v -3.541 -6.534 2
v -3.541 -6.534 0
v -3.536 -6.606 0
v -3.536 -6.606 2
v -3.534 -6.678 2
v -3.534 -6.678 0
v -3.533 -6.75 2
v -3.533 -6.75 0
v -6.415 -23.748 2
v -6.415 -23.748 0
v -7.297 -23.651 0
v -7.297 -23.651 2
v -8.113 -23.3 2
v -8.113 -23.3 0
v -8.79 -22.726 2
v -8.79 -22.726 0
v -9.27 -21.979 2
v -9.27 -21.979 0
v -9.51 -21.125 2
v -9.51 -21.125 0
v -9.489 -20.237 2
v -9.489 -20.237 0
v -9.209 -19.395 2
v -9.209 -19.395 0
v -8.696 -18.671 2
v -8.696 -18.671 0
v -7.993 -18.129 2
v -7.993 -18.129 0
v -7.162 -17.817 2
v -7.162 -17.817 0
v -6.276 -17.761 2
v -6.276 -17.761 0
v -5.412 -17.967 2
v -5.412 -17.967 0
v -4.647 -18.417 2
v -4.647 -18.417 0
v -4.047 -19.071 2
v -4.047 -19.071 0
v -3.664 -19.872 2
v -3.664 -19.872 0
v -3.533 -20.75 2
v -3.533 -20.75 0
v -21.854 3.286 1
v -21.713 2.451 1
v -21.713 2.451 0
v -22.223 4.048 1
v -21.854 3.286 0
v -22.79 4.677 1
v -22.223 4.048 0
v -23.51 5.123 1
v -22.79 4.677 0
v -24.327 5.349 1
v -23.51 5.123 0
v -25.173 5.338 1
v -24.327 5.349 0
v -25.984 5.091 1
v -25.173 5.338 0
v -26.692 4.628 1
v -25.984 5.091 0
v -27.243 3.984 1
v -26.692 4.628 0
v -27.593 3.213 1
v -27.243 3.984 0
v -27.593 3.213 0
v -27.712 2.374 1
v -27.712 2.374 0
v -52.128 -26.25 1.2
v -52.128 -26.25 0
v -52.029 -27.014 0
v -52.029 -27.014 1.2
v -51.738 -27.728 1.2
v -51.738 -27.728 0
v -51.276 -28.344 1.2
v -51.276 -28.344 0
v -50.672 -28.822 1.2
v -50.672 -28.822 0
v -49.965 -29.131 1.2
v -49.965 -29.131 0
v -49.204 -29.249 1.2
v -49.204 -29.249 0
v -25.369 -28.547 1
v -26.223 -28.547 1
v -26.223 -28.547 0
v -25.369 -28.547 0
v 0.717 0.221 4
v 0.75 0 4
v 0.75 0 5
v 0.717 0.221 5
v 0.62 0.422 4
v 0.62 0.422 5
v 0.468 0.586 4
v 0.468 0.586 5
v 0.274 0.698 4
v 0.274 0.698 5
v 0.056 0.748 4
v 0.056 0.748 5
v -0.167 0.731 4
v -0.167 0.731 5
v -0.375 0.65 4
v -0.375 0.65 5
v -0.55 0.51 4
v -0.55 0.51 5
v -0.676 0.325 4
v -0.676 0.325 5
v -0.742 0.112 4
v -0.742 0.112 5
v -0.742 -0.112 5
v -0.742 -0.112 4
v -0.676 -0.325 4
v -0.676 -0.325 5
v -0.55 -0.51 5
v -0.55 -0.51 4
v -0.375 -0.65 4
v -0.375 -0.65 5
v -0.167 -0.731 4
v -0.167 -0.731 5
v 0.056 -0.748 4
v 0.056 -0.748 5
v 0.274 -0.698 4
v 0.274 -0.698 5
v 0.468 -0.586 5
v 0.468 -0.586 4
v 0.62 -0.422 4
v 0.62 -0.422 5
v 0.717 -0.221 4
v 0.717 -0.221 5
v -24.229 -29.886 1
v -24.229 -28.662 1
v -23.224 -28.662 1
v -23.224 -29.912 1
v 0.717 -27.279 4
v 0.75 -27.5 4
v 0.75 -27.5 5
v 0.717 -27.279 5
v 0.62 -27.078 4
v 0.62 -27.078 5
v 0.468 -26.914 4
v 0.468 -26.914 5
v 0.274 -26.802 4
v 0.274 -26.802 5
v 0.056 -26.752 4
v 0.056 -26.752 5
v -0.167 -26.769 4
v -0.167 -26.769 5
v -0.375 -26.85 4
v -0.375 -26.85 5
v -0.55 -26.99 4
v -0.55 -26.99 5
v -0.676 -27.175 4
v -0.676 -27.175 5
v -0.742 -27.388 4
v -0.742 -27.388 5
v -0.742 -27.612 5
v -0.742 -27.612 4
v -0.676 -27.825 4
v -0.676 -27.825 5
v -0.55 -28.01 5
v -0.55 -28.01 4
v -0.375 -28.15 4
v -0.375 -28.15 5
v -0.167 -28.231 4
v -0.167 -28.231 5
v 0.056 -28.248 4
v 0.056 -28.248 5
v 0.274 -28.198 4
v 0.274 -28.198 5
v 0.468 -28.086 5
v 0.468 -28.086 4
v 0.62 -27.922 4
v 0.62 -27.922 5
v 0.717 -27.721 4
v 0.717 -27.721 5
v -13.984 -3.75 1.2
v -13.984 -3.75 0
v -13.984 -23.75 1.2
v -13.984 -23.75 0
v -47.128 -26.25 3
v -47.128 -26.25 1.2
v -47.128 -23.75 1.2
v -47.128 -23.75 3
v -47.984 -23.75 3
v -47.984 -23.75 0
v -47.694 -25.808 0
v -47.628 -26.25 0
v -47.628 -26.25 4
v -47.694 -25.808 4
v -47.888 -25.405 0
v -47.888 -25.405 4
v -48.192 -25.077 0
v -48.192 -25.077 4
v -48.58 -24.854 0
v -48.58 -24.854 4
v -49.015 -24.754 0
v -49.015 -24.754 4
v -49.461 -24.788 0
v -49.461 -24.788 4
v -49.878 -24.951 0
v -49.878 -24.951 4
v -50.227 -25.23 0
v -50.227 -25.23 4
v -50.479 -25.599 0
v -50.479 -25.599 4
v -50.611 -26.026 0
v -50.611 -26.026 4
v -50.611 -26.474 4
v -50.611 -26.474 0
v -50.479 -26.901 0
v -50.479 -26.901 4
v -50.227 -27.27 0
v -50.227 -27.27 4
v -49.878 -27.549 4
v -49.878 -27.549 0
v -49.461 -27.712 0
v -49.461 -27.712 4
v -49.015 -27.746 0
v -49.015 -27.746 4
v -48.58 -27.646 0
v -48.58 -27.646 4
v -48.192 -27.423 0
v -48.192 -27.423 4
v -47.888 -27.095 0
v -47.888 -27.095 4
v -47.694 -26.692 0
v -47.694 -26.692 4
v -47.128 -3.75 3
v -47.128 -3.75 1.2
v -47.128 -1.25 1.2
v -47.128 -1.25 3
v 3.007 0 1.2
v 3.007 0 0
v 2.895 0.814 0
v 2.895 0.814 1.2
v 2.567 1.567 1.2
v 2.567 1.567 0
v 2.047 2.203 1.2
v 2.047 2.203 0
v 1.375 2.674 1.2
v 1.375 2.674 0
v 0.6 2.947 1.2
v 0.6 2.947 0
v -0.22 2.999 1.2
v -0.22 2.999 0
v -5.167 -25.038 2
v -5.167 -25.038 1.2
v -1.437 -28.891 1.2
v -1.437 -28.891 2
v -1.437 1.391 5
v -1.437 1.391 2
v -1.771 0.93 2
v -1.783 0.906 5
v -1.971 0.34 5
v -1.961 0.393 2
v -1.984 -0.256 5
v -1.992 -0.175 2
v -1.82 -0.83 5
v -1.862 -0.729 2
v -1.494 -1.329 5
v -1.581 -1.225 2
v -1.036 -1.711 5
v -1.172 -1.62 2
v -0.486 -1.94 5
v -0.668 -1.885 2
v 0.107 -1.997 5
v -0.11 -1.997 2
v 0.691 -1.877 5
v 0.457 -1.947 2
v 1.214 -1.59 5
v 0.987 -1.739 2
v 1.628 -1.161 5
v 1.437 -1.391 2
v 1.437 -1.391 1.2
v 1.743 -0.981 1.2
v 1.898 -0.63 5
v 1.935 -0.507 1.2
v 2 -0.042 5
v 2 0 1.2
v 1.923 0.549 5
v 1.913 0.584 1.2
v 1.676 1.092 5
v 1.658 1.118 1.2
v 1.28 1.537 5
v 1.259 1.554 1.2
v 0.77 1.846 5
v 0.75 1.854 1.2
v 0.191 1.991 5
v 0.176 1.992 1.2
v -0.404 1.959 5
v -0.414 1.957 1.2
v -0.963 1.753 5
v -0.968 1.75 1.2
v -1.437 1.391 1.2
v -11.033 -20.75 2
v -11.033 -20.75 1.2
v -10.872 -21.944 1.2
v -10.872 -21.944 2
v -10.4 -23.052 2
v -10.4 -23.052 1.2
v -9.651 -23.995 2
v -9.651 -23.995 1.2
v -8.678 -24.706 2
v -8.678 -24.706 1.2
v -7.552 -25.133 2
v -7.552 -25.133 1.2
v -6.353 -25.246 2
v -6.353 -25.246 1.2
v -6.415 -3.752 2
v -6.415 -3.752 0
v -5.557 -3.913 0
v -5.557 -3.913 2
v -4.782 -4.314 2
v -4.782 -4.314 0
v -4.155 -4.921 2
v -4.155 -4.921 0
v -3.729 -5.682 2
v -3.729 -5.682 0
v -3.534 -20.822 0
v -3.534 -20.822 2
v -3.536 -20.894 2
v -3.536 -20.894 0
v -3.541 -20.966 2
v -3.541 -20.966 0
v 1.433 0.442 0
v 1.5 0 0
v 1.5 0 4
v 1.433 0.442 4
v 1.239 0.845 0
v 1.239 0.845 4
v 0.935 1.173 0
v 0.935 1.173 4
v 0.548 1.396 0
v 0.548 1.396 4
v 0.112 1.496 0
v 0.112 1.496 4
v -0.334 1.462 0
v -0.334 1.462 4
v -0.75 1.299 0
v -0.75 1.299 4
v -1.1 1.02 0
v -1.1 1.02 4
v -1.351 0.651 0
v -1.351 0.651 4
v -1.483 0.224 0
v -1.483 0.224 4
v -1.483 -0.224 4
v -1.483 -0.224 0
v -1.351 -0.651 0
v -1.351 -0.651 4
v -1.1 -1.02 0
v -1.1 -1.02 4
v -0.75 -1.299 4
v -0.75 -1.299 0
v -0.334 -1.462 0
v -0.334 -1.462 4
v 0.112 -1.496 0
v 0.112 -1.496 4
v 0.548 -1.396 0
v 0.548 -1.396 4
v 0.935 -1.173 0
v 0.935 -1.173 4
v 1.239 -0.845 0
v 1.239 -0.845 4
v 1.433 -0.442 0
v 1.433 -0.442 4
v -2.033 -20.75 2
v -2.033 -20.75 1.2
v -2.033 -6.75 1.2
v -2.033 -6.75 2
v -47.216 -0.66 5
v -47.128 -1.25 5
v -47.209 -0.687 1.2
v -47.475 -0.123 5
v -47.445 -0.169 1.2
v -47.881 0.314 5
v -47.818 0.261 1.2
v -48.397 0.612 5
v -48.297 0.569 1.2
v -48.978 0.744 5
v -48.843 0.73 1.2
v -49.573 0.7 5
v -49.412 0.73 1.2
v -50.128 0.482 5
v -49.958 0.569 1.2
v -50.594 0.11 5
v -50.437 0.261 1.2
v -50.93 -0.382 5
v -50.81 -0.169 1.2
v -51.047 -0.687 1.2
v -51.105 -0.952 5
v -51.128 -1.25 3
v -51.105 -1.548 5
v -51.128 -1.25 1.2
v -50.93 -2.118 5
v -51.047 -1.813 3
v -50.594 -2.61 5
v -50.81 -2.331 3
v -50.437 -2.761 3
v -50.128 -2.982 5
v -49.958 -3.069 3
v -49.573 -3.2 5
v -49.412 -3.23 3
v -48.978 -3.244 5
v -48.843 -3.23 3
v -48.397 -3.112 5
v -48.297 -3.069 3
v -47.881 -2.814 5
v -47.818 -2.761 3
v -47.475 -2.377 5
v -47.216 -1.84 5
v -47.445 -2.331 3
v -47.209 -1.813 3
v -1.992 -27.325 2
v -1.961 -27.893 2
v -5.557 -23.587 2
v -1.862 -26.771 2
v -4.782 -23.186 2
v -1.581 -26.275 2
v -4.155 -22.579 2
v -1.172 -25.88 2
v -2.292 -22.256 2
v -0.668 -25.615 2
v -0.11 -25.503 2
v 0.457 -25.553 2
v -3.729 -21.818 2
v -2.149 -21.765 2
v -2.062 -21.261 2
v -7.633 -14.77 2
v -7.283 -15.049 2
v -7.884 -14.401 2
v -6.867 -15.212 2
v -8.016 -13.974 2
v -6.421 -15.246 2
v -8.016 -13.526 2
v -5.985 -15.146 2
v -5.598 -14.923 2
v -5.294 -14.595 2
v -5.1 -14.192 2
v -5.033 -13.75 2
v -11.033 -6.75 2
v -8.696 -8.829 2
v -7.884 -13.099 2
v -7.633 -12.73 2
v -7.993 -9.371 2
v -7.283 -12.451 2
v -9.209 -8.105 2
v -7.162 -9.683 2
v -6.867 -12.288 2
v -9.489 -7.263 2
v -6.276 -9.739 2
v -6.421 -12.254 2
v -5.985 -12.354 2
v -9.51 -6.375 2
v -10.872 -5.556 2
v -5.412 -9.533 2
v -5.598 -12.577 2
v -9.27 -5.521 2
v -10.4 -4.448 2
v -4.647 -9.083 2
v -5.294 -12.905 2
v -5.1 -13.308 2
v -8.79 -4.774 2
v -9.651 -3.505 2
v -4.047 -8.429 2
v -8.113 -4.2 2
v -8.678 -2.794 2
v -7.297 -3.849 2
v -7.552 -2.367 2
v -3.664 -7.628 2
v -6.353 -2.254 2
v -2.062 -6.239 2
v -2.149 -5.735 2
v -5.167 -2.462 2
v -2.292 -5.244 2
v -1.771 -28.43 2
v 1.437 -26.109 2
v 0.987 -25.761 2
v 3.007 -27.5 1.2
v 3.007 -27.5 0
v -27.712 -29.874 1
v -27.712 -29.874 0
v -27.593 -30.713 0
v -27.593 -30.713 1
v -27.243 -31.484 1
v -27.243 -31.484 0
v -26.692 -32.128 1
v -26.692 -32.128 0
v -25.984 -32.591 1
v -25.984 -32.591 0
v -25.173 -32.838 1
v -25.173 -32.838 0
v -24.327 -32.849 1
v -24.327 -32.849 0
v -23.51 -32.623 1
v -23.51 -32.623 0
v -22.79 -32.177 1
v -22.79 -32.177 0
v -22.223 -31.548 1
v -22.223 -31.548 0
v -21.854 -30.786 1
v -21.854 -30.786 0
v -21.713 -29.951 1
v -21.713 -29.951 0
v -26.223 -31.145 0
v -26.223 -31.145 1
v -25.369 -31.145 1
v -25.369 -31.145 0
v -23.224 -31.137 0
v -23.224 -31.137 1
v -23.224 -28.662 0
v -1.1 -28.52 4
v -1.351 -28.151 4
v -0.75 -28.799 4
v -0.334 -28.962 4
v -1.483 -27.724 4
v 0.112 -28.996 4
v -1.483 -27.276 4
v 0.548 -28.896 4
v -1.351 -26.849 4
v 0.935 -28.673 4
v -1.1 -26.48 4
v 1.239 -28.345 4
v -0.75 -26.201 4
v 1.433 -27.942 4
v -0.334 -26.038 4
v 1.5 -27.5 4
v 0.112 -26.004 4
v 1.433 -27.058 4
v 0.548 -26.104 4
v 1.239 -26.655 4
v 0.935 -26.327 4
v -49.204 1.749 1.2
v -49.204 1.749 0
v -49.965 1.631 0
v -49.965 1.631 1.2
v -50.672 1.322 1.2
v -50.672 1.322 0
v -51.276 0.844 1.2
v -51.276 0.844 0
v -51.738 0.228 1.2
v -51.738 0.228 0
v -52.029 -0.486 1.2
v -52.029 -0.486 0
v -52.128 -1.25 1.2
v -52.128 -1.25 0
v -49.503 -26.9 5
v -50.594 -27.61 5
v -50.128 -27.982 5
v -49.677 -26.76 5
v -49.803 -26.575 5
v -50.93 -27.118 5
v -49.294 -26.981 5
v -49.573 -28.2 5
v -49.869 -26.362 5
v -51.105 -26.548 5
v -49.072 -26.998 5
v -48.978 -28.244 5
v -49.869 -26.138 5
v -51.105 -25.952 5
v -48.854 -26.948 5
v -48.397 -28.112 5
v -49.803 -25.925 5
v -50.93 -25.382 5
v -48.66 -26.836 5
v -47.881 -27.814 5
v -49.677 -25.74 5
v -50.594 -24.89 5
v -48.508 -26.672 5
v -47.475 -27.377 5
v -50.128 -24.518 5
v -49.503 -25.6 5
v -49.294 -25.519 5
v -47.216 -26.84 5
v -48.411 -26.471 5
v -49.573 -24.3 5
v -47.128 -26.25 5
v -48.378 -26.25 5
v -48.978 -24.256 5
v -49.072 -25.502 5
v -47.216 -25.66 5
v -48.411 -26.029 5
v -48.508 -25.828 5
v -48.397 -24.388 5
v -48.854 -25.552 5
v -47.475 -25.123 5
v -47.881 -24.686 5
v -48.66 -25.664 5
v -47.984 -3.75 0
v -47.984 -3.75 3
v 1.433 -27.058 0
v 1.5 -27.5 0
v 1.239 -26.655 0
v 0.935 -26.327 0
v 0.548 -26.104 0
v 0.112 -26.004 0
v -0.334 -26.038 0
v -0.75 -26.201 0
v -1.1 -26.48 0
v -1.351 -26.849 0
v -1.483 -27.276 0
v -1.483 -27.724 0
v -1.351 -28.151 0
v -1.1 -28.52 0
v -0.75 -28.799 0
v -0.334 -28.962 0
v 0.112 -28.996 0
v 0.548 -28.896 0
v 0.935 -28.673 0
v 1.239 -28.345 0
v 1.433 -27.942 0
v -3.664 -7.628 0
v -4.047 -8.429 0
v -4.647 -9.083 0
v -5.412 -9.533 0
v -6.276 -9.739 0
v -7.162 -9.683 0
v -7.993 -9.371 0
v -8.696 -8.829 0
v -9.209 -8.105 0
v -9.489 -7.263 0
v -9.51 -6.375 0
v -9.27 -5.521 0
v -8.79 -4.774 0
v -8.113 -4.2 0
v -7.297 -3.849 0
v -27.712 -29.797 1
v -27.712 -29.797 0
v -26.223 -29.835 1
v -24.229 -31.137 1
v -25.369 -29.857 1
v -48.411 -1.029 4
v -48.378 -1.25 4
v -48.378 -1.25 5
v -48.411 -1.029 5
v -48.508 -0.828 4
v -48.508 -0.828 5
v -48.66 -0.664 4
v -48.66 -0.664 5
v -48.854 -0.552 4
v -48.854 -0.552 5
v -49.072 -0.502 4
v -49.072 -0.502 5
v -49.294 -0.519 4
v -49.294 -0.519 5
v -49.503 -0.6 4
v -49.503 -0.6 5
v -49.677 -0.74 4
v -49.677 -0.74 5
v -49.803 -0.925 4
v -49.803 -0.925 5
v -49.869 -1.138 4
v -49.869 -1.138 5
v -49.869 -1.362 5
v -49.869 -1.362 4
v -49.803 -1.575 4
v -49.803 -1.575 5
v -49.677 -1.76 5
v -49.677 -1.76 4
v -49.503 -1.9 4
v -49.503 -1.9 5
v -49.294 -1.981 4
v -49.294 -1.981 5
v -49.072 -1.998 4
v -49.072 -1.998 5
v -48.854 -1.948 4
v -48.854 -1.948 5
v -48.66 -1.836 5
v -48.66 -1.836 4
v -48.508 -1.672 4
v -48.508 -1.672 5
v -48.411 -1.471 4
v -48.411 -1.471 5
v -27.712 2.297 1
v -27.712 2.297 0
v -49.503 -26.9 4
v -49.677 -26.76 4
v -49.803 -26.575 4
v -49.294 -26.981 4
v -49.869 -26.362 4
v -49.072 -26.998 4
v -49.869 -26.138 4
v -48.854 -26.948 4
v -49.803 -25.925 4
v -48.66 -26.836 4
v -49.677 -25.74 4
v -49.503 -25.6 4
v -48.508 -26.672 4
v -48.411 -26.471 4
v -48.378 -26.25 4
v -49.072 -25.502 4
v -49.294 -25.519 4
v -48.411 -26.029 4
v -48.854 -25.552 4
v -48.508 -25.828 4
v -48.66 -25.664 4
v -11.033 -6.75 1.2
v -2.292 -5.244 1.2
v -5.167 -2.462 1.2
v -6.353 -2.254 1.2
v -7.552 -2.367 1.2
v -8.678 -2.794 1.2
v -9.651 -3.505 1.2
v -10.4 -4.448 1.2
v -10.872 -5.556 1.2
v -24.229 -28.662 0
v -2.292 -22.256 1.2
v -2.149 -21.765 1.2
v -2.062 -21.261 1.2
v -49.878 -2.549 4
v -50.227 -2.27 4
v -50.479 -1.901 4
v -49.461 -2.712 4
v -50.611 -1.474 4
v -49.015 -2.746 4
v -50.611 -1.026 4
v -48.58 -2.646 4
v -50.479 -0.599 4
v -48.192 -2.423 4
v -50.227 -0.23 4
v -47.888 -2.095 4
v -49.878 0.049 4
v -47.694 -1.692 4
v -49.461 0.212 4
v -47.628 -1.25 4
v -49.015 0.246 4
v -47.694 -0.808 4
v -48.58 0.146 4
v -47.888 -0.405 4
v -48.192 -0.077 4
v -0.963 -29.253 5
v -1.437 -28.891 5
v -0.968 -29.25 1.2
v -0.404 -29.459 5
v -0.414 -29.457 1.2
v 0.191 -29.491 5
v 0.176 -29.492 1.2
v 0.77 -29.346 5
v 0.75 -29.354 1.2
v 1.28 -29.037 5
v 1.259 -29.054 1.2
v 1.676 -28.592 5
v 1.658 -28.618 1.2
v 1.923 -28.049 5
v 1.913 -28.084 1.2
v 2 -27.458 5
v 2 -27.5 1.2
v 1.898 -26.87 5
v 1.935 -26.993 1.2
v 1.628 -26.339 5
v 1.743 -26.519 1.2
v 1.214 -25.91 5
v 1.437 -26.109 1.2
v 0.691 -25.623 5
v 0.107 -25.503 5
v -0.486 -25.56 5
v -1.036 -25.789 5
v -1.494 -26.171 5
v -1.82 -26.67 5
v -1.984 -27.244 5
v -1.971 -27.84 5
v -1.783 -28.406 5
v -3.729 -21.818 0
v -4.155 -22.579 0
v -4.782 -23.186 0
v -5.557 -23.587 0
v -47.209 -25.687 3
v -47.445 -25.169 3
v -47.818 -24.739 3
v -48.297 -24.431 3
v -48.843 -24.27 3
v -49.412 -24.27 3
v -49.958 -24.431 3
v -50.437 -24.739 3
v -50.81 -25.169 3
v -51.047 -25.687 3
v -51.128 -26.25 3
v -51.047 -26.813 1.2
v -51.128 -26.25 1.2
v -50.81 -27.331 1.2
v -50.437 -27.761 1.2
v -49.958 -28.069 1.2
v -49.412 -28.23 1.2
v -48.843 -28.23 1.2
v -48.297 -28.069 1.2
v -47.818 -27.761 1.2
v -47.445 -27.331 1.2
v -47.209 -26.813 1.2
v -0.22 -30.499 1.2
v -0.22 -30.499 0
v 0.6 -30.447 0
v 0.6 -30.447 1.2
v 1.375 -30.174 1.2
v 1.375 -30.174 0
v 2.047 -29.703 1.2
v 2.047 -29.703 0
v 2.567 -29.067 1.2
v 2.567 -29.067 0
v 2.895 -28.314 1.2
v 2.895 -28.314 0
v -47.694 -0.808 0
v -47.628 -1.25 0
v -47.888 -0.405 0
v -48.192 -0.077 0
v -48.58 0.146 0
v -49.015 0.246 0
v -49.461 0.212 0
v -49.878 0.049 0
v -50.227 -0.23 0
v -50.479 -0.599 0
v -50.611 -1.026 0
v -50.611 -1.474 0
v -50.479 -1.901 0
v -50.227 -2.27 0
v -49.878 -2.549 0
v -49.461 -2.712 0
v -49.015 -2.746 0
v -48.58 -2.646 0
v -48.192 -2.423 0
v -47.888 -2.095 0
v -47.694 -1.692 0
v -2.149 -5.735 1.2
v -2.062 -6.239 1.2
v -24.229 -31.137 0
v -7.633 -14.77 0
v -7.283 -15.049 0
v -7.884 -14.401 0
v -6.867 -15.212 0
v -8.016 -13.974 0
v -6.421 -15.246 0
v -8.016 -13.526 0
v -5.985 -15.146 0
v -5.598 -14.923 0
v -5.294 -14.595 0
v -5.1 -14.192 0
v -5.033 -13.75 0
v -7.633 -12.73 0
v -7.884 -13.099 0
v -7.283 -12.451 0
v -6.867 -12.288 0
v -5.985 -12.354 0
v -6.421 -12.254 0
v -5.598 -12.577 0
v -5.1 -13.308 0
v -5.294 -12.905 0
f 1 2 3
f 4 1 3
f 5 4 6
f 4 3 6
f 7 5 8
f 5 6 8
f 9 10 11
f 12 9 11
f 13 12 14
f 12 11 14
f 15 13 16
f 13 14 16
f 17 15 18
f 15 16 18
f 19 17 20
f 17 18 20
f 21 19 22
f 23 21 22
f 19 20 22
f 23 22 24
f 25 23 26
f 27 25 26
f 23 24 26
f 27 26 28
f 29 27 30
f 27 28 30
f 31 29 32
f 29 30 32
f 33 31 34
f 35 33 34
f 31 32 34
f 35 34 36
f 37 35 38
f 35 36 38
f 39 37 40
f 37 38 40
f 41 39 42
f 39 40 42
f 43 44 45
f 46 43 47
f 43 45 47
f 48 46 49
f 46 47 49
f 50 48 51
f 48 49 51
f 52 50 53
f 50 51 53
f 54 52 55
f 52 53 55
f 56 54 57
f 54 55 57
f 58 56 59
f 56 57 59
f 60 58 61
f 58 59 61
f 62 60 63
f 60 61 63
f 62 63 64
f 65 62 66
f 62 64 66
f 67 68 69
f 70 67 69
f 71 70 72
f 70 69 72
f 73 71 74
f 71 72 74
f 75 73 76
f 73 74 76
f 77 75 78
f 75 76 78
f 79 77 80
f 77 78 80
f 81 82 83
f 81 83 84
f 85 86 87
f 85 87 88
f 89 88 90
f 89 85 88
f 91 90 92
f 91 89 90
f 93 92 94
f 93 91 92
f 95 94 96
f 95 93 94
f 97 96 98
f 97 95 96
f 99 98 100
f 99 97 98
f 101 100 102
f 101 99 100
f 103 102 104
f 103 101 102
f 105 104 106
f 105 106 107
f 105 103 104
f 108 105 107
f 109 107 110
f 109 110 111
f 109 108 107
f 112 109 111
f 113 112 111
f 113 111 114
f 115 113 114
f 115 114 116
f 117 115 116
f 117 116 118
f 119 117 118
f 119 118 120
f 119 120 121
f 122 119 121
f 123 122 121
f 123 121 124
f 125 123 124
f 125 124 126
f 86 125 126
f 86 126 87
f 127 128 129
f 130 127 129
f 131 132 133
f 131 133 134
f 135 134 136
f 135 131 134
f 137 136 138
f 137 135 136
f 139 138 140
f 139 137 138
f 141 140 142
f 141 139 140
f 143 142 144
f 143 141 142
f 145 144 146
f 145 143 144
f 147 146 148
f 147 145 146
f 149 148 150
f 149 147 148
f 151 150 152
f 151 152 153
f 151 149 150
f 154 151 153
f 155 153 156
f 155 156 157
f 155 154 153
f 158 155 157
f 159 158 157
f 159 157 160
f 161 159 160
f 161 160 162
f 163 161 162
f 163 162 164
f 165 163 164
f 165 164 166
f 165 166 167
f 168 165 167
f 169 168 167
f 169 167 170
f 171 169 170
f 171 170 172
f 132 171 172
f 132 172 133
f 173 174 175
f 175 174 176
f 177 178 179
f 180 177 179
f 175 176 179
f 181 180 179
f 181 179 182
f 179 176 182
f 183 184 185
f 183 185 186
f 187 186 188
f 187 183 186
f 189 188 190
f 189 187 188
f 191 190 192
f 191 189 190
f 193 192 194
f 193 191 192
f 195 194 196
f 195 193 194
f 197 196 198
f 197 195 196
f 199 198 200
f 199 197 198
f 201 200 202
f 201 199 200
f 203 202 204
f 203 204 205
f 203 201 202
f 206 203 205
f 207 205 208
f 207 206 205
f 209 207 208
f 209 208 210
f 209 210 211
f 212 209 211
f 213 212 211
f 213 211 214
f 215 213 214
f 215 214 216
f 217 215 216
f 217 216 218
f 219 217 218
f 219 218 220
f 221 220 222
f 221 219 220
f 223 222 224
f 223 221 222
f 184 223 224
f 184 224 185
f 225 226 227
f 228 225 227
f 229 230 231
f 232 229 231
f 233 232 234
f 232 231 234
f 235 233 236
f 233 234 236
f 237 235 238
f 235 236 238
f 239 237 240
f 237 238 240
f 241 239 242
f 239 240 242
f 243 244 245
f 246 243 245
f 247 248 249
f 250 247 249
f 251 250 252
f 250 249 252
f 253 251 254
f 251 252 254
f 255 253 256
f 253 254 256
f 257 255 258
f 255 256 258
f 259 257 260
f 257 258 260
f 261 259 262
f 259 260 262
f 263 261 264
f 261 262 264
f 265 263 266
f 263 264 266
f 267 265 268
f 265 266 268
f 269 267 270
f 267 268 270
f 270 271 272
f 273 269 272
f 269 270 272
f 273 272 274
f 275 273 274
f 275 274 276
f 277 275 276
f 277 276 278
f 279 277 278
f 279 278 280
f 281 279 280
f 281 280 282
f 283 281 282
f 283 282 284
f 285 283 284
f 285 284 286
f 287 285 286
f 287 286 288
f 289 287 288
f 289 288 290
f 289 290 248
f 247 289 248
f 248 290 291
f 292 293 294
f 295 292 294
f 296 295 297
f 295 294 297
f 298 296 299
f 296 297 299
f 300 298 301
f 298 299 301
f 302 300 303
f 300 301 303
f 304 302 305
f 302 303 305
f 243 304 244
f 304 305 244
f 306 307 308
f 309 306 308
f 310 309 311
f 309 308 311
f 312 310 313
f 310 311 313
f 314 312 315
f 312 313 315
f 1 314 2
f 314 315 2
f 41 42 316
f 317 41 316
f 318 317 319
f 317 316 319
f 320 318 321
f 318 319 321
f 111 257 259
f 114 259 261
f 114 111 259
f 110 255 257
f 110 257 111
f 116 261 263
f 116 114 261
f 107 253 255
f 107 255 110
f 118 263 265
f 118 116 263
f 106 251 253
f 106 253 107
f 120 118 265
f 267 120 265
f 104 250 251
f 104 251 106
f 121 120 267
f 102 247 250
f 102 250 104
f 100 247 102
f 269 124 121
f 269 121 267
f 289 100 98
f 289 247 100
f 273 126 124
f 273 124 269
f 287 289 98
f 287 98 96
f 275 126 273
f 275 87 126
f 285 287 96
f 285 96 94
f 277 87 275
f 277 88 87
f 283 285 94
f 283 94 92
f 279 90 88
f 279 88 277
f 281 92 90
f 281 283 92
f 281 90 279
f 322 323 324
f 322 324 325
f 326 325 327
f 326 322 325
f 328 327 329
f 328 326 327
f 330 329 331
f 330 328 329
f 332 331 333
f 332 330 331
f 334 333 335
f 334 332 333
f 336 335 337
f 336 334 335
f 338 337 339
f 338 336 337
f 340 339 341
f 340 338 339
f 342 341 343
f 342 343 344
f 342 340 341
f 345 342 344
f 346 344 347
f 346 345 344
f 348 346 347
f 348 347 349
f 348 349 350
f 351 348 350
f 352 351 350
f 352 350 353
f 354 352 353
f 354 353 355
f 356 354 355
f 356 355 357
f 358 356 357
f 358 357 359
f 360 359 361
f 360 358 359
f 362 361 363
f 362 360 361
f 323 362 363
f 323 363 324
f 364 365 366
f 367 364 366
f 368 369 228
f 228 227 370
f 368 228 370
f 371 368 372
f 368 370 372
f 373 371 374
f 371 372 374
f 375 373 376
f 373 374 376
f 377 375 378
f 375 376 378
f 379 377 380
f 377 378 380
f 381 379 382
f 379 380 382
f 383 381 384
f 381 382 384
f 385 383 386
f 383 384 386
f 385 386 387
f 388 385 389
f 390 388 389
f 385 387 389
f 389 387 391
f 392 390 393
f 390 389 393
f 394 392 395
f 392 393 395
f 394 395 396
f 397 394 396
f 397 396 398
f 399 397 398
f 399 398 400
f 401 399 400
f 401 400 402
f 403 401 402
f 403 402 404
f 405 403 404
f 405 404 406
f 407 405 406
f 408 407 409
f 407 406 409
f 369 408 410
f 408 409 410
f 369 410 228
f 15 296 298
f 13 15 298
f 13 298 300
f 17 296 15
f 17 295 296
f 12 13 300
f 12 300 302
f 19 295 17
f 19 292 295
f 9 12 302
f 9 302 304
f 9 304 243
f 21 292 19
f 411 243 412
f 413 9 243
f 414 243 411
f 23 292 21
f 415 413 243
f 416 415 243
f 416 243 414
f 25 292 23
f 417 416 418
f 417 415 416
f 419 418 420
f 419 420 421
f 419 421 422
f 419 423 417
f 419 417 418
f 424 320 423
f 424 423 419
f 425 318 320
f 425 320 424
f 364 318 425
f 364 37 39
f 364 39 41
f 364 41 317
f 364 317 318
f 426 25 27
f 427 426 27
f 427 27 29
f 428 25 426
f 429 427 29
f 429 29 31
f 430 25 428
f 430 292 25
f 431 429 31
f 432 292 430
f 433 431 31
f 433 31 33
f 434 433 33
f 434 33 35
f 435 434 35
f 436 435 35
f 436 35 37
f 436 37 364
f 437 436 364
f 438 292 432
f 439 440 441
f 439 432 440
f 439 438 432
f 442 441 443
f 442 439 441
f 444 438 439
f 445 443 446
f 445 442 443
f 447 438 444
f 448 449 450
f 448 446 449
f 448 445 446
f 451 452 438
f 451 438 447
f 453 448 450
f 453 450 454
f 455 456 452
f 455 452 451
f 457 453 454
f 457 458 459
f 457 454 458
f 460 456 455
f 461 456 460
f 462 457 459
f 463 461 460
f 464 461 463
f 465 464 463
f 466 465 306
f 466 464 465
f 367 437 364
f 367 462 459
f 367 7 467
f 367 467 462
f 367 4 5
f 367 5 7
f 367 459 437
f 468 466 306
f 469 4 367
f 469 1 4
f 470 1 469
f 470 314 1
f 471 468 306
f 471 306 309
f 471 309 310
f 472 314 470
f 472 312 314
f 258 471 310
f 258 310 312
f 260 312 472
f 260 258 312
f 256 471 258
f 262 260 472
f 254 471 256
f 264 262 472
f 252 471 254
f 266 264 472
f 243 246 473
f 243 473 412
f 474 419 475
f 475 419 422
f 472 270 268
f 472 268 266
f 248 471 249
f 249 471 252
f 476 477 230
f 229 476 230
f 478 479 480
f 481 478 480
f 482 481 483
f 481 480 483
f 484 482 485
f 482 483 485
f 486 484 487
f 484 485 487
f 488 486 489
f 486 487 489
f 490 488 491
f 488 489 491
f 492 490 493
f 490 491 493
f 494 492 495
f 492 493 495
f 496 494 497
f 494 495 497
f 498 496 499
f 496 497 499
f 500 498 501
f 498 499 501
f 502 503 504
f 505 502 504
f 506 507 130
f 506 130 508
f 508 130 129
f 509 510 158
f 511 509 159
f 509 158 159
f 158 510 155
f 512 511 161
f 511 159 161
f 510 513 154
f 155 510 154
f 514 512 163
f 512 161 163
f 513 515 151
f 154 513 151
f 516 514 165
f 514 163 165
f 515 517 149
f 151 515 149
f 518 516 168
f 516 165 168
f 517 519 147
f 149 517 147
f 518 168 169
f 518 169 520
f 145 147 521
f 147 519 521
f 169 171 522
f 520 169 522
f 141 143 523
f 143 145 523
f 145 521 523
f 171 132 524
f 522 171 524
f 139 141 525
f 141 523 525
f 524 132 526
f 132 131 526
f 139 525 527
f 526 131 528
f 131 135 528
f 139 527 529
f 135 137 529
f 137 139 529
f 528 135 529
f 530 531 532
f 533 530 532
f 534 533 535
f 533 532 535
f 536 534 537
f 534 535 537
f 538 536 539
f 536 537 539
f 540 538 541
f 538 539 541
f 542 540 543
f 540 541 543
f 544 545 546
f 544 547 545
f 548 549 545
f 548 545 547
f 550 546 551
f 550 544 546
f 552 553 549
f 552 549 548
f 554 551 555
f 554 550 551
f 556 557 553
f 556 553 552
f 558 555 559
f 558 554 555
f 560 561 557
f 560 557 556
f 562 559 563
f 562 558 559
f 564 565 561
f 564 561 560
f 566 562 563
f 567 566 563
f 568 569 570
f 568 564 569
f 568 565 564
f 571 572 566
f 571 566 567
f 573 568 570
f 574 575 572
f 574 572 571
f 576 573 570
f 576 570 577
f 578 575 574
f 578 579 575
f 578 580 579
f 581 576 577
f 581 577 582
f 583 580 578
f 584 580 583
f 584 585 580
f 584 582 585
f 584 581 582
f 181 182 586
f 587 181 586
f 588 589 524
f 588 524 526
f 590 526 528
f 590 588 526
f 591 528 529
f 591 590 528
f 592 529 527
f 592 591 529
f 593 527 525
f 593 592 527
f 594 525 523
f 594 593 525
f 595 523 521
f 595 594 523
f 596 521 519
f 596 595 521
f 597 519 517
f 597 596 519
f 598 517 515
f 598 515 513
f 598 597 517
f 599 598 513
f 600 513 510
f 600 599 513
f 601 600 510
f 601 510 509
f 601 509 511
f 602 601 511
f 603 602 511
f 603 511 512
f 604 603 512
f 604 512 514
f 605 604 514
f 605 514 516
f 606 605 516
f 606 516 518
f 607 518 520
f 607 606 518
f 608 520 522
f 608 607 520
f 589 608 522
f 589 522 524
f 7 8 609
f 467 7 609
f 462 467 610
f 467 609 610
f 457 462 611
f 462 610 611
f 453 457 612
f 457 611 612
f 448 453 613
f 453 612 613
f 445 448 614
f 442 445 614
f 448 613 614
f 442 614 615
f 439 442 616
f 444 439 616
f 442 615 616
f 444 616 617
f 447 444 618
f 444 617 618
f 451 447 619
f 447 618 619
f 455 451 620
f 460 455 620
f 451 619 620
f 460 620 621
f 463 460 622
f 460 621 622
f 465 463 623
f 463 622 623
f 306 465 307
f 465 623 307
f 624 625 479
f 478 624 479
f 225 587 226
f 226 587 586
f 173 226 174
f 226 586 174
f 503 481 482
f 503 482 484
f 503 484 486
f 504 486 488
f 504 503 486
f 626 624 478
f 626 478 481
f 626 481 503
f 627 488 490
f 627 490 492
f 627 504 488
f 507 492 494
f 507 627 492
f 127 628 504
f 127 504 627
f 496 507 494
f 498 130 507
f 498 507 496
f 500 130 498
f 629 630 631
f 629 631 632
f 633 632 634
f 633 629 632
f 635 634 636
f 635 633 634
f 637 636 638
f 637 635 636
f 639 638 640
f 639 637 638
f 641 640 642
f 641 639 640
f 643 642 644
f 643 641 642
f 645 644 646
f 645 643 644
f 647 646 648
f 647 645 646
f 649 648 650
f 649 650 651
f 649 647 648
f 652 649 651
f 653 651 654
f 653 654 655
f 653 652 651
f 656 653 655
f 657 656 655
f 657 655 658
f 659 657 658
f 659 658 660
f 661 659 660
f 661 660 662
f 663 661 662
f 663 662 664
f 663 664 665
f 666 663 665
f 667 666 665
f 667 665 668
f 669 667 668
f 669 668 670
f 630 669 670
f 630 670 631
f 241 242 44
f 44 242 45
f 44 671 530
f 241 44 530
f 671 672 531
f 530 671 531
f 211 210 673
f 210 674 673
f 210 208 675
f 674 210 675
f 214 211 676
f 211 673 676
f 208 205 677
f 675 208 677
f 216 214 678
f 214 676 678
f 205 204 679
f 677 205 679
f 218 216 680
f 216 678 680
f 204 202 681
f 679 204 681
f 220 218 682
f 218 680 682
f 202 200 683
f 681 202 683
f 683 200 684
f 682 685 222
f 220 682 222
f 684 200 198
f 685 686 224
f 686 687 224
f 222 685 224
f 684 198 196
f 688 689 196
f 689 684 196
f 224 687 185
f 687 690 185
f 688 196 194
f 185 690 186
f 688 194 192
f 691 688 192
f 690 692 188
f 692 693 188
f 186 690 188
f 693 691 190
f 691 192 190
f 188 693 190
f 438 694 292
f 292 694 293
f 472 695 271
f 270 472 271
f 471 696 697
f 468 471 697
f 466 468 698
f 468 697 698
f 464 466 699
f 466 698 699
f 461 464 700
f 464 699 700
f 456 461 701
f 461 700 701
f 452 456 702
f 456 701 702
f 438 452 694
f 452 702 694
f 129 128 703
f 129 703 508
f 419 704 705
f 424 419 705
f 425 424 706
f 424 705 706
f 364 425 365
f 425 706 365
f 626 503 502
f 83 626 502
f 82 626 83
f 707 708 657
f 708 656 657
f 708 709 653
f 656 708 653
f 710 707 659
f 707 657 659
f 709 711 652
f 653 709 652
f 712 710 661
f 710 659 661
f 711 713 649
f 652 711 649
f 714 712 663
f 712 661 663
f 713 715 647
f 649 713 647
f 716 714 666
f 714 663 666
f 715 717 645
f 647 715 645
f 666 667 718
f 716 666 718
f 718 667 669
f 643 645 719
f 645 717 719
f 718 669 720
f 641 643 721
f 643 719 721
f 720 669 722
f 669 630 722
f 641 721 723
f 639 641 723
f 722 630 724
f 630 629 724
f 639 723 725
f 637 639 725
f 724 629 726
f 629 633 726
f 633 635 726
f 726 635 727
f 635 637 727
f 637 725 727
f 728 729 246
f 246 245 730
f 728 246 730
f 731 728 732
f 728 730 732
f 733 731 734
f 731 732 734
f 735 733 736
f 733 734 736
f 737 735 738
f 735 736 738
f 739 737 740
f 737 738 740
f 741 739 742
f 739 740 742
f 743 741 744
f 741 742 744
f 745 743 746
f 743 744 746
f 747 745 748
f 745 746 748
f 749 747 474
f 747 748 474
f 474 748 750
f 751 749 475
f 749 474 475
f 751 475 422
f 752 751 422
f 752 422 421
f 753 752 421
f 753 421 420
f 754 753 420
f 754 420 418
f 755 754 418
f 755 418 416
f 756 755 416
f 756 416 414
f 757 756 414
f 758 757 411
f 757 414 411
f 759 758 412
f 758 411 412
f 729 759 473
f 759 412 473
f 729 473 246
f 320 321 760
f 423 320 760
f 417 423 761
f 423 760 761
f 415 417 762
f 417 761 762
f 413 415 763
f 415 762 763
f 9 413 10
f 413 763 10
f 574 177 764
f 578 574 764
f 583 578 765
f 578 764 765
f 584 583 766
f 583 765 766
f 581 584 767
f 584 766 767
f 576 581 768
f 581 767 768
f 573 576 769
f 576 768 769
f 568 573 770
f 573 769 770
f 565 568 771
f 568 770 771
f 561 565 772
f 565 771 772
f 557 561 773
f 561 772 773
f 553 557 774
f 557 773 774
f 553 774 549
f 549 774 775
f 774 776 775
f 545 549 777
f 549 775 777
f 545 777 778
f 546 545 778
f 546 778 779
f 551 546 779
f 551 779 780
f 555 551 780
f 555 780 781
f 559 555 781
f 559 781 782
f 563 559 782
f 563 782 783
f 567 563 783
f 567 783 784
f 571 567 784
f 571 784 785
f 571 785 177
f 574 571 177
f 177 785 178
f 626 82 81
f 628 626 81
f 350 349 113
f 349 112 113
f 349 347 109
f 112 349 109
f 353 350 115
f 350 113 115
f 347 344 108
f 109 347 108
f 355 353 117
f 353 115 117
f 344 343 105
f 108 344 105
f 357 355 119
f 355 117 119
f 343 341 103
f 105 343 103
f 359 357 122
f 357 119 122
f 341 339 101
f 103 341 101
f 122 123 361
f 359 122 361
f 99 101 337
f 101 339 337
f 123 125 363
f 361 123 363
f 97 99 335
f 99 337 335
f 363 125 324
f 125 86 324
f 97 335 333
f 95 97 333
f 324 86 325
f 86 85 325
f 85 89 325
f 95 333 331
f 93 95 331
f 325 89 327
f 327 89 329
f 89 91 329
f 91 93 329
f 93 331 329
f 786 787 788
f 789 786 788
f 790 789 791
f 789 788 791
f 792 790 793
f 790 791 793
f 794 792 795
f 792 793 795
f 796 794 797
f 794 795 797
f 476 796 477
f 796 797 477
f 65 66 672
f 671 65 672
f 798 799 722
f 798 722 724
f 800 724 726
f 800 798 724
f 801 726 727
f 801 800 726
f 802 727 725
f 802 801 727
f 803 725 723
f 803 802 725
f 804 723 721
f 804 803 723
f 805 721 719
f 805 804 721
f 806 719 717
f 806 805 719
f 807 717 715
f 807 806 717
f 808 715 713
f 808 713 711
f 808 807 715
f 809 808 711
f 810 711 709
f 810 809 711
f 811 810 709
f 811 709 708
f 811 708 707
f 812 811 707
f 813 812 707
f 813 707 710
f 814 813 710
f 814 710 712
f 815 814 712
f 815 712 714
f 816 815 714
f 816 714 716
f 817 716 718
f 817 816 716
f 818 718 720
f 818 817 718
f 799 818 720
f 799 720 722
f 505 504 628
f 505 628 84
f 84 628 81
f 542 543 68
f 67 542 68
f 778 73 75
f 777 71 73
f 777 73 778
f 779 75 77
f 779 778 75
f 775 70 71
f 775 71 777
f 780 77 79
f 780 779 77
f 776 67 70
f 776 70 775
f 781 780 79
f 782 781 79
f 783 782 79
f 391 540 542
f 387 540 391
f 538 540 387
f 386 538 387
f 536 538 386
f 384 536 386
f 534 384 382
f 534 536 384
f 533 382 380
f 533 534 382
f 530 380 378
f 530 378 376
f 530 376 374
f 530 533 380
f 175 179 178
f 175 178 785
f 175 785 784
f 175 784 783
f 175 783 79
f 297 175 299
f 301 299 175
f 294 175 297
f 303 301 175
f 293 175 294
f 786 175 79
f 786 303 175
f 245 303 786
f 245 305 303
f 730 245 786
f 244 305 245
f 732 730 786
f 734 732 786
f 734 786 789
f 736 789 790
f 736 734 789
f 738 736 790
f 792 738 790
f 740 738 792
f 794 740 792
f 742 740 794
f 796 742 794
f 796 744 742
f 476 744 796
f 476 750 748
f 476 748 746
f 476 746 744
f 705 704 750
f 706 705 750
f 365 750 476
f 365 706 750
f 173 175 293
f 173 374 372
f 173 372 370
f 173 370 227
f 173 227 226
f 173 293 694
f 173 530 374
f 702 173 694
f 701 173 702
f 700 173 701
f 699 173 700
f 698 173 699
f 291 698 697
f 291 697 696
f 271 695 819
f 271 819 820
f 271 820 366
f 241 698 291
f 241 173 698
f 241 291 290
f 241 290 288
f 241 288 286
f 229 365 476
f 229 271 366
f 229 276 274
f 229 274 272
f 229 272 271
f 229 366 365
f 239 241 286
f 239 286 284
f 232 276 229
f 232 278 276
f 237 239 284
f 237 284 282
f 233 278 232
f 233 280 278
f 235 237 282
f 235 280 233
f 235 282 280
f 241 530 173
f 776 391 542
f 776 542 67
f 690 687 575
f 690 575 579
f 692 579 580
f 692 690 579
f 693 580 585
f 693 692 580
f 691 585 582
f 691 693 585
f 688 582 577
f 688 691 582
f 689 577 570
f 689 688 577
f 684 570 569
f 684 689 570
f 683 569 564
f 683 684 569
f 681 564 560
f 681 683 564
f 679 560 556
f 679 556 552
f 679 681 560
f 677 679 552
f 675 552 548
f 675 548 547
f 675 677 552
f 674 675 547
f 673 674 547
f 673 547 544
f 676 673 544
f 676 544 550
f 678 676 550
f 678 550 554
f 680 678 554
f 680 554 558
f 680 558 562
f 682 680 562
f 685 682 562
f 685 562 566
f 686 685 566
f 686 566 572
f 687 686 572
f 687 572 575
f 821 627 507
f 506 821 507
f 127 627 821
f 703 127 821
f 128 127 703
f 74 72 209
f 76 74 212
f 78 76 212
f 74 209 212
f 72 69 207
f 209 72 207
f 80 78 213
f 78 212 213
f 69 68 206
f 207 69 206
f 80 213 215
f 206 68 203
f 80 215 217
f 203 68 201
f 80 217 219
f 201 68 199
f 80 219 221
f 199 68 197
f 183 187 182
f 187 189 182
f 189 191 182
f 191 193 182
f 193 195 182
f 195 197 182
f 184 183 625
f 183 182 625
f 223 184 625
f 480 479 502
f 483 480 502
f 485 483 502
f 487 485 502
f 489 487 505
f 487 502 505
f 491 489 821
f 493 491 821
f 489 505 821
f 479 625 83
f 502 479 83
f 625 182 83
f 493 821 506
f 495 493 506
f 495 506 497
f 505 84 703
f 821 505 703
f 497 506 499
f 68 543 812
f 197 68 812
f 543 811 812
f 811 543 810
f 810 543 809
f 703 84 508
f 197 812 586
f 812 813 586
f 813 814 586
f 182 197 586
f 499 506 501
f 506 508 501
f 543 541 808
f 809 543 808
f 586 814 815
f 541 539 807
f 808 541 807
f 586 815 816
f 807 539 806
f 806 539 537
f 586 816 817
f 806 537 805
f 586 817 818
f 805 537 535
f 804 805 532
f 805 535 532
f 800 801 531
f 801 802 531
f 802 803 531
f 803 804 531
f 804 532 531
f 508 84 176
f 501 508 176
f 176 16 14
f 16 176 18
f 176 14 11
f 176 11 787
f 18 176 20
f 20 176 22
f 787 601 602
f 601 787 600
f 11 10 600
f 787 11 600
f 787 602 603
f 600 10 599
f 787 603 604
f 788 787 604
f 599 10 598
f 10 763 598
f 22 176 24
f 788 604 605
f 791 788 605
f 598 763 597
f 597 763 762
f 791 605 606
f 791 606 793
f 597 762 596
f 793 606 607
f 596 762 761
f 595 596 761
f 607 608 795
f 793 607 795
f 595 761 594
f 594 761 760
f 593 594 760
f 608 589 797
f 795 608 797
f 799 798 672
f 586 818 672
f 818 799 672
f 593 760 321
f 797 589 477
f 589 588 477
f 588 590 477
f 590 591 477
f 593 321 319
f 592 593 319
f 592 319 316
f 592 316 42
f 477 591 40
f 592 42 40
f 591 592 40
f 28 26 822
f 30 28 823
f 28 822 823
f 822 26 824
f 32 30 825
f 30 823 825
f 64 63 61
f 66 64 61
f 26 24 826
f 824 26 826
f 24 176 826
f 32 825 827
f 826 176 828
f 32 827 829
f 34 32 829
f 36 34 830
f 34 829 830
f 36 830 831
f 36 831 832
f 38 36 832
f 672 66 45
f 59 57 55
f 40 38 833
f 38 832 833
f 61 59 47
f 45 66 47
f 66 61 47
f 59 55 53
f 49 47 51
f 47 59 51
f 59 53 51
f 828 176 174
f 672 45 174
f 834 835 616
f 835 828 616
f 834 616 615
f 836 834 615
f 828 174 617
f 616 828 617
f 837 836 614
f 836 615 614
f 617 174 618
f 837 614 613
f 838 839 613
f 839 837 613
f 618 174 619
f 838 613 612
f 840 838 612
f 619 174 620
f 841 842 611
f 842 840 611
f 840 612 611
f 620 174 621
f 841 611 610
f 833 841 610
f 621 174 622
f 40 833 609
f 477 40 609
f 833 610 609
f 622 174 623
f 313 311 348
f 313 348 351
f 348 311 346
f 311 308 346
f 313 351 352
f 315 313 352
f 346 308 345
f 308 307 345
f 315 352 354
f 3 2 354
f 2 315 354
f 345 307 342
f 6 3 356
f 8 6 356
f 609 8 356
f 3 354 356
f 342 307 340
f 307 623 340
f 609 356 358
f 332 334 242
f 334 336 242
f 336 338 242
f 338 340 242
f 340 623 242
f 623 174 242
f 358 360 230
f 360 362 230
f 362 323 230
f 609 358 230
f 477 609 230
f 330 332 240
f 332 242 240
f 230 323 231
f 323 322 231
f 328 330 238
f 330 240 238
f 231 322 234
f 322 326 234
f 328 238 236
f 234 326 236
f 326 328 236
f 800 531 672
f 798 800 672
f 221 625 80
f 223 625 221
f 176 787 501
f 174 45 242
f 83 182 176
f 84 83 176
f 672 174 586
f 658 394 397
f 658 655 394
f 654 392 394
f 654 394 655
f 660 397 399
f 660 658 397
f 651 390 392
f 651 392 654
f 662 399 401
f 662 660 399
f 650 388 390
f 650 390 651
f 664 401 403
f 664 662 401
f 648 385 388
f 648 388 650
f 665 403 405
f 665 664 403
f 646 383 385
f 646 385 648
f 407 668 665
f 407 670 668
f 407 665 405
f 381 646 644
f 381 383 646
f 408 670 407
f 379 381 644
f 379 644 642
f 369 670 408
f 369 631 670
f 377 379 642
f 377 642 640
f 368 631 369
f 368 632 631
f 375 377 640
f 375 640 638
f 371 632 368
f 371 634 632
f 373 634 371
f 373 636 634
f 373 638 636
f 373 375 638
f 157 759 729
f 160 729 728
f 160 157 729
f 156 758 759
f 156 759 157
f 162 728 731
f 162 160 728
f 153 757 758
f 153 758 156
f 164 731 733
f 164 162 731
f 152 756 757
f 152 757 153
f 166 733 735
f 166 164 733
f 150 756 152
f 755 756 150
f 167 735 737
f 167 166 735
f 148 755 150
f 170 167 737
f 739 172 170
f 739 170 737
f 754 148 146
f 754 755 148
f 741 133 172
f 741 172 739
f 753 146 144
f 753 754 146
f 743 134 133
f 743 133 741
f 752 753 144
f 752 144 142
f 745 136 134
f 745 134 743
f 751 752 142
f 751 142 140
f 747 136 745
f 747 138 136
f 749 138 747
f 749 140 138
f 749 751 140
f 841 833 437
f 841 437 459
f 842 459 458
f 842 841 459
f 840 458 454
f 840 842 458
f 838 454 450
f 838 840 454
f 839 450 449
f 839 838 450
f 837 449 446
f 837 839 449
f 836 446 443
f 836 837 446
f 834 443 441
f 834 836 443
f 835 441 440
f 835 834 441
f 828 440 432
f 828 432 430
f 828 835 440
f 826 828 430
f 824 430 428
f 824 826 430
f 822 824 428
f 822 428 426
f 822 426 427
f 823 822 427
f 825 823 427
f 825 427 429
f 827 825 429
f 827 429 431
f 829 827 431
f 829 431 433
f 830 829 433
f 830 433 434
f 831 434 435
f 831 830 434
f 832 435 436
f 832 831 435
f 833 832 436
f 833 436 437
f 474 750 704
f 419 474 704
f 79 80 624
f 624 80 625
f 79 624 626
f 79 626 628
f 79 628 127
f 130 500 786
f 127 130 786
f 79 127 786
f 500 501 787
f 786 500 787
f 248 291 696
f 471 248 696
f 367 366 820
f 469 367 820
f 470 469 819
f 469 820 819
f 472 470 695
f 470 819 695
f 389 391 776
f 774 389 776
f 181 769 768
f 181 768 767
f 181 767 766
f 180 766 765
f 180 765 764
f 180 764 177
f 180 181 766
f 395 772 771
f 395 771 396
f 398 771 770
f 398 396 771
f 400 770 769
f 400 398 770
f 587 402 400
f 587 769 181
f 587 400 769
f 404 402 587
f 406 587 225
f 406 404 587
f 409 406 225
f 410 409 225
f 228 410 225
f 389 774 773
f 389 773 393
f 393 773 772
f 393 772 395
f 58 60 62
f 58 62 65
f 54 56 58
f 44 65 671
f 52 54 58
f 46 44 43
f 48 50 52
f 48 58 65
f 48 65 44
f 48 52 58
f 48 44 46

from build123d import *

# Parameters (mm, degrees)
EXTRUDE_1_DEPTH     = 1.2
SKETCH_2_8_R        = 1.5
EXTRUDE_7_DEPTH     = 2
SKETCH_2_9_R        = 1.5
EXTRUDE_8_DEPTH     = 5
SKETCH_2_10_R       = 1.5
EXTRUDE_9_DEPTH     = 5
SKETCH_2_11_R       = 1.5
EXTRUDE_10_DEPTH    = 5
SKETCH_2_12_R       = 1.5
EXTRUDE_11_DEPTH    = 5
SKETCH_2_13_R       = 1.5
SKETCH_2_13_R_2     = 0.75
EXTRUDE_12_DEPTH    = 5
SKETCH_2_14_R       = 1.5
SKETCH_2_14_R_2     = 0.75
EXTRUDE_13_DEPTH    = 5
SKETCH_2_15_R       = 1.5
SKETCH_2_15_R_2     = 0.75
EXTRUDE_14_DEPTH    = 5
SKETCH_2_16_R       = 1.5
SKETCH_2_16_R_2     = 0.75
EXTRUDE_15_DEPTH    = 5
SKETCH_2_19_R       = 1.5
SKETCH_2_19_R_2     = 0.75
CUT_EXTRUDE_4_DEPTH = 4
SKETCH_2_20_R       = 1.5
SKETCH_2_20_R_2     = 0.75
CUT_EXTRUDE_5_DEPTH = 4
SKETCH_2_21_R       = 1.5
SKETCH_2_21_R_2     = 0.75
CUT_EXTRUDE_6_DEPTH = 4
SKETCH_2_22_R       = 1.5
SKETCH_2_22_R_2     = 0.75
CUT_EXTRUDE_7_DEPTH = 4
EXTRUDE_16_DEPTH    = 3
EXTRUDE_18_DEPTH    = 2
EXTRUDE_19_DEPTH    = 1
SKETCH_5_W          = 0.85413001
SKETCH_5_H          = 2.598019217
SKETCH_5_W_2        = 1.005417368
SKETCH_5_H_2        = 2.475260341
CUT_EXTRUDE_9_DEPTH = 1


with BuildPart() as part:
    # 草图2 → 凸台-拉伸1 (new body)
    with BuildSketch(Plane.XY):
        with BuildLine():
            Line((-0.220057138, 2.999023685), (-49.204110666, 1.749023685))
            ThreePointArc((-49.204110666, 1.749023685), (-51.275787659, 0.844087888), (-52.127580054, -1.25))
            Line((-52.127580054, -1.25), (-52.127580054, -26.25))
            ThreePointArc((-52.127580054, -26.25), (-51.275787659, -28.344087888), (-49.204110666, -29.249023685))
            Line((-49.204110666, -29.249023685), (-0.220057138, -30.499023685))
            ThreePointArc((-0.220057138, -30.499023685), (2.04705122, -29.702759522), (3.007086332, -27.5))
            Line((3.007086332, -27.5), (3.007086332, 0))
            ThreePointArc((3.007086332, 0), (2.04705122, 2.202759522), (-0.220057138, 2.999023685))
        make_face()
        with BuildLine():
            ThreePointArc((2, -27.5), (0.750249731, -29.353948581), (-1.437125342, -28.890924423))
            Line((-1.437125342, -28.890924423), (-5.166627539, -25.037543154))
            ThreePointArc((-5.166627539, -25.037543154), (-9.188308261, -24.383089324), (-11.033, -20.75))
            Line((-11.033, -20.75), (-11.033, -6.75))
            ThreePointArc((-11.033, -6.75), (-9.188308261, -3.116910676), (-5.166627539, -2.462456846))
            Line((-5.166627539, -2.462456846), (-1.437125342, 1.390924423))
            ThreePointArc((-1.437125342, 1.390924423), (0.750249731, 1.853948581), (2, 0))
            ThreePointArc((2, 0), (1.853948581, -0.750249731), (1.437125342, -1.390924423))
            Line((1.437125342, -1.390924423), (-2.292376856, -5.244305693))
            ThreePointArc((-2.292376856, -5.244305693), (-2.098318267, -5.986064188), (-2.033, -6.75))
            Line((-2.033, -6.75), (-2.033, -20.75))
            ThreePointArc((-2.033, -20.75), (-2.098318267, -21.513935812), (-2.292376856, -22.255694307))
            Line((-2.292376856, -22.255694307), (1.437125342, -26.109075577))
            ThreePointArc((1.437125342, -26.109075577), (1.853948581, -26.749750269), (2, -27.5))
        make_face(mode=Mode.SUBTRACT)
        with BuildLine():
            ThreePointArc((-47.127580054, -26.25), (-49.127580054, -28.25), (-51.127580054, -26.25))
            Line((-51.127580054, -26.25), (-51.127580054, -1.25))
            ThreePointArc((-51.127580054, -1.25), (-49.127580054, 0.75), (-47.127580054, -1.25))
            Line((-47.127580054, -1.25), (-47.127580054, -3.75))
            Line((-47.127580054, -3.75), (-13.984053528, -3.75))
            Line((-13.984053528, -3.75), (-13.984053528, -13.75))
            Line((-13.984053528, -13.75), (-13.984053528, -23.75))
            Line((-13.984053528, -23.75), (-47.127580054, -23.75))
            Line((-47.127580054, -23.75), (-47.127580054, -26.25))
        make_face(mode=Mode.SUBTRACT)
    extrude(amount=EXTRUDE_1_DEPTH)

    # 草图2<8> → 凸台-拉伸7 (add)
    with BuildSketch(Plane.XY):
        with BuildLine():
            ThreePointArc((-11.033, -20.75), (-9.188308261, -24.383089324), (-5.166627539, -25.037543154))
            Line((-5.166627539, -25.037543154), (-6.415024561, -23.747679402))
            ThreePointArc((-6.415024561, -23.747679402), (-8.695628761, -18.670808609), (-3.533, -20.75))
            ThreePointArc((-3.533, -20.75), (-3.534944099, -20.857985255), (-3.540773877, -20.965830555))
            Line((-3.540773877, -20.965830555), (-2.292376856, -22.255694307))
            ThreePointArc((-2.292376856, -22.255694307), (-2.098318267, -21.513935812), (-2.033, -20.75))
            Line((-2.033, -20.75), (-2.033, -6.75))
            ThreePointArc((-2.033, -6.75), (-2.098318267, -5.986064188), (-2.292376856, -5.244305693))
            Line((-2.292376856, -5.244305693), (-3.540773877, -6.534169445))
            ThreePointArc((-3.540773877, -6.534169445), (-3.534944099, -6.642014745), (-3.533, -6.75))
            ThreePointArc((-3.533, -6.75), (-8.695628761, -8.829191391), (-6.415024561, -3.752320598))
            Line((-6.415024561, -3.752320598), (-5.166627539, -2.462456846))
            ThreePointArc((-5.166627539, -2.462456846), (-9.188308261, -3.116910676), (-11.033, -6.75))
            Line((-11.033, -6.75), (-11.033, -20.75))
        make_face()
        with Locations((-6.533, -13.75)):
            Circle(SKETCH_2_8_R, mode=Mode.SUBTRACT)
    extrude(amount=EXTRUDE_7_DEPTH)

    # 草图2<9> → 凸台-拉伸8 (add)
    with BuildSketch(Plane.XY):
        with BuildLine():
            ThreePointArc((-47.127580054, -1.25), (-49.127580054, 0.75), (-51.127580054, -1.25))
            ThreePointArc((-51.127580054, -1.25), (-49.127580054, -3.25), (-47.127580054, -1.25))
        make_face()
        with Locations((-49.127580054, -1.25)):
            Circle(SKETCH_2_9_R, mode=Mode.SUBTRACT)
    extrude(amount=EXTRUDE_8_DEPTH)

    # 草图2<10> → 凸台-拉伸9 (add)
    with BuildSketch(Plane.XY):
        with BuildLine():
            ThreePointArc((1.437125342, -26.109075577), (-1.390924423, -26.062874658), (-1.437125342, -28.890924423))
            ThreePointArc((-1.437125342, -28.890924423), (0.750249731, -29.353948581), (2, -27.5))
            ThreePointArc((2, -27.5), (1.853948581, -26.749750269), (1.437125342, -26.109075577))
        make_face()
        with Locations((0, -27.5)):
            Circle(SKETCH_2_10_R, mode=Mode.SUBTRACT)
    extrude(amount=EXTRUDE_9_DEPTH)

    # 草图2<11> → 凸台-拉伸10 (add)
    with BuildSketch(Plane.XY):
        with BuildLine():
            ThreePointArc((2, 0), (0.750249731, 1.853948581), (-1.437125342, 1.390924423))
            ThreePointArc((-1.437125342, 1.390924423), (-1.390924423, -1.437125342), (1.437125342, -1.390924423))
            ThreePointArc((1.437125342, -1.390924423), (1.853948581, -0.750249731), (2, 0))
        make_face()
        Circle(SKETCH_2_11_R, mode=Mode.SUBTRACT)
    extrude(amount=EXTRUDE_10_DEPTH)

    # 草图2<12> → 凸台-拉伸11 (add)
    with BuildSketch(Plane.XY):
        with BuildLine():
            ThreePointArc((-47.127580054, -26.25), (-49.127580054, -24.25), (-51.127580054, -26.25))
            ThreePointArc((-51.127580054, -26.25), (-49.127580054, -28.25), (-47.127580054, -26.25))
        make_face()
        with Locations((-49.127580054, -26.25)):
            Circle(SKETCH_2_12_R, mode=Mode.SUBTRACT)
    extrude(amount=EXTRUDE_11_DEPTH)

    # 草图2<13> → 凸台-拉伸12 (add)
    with BuildSketch(Plane.XY):
        with Locations((-49.127580054, -1.25)):
            Circle(SKETCH_2_13_R)
        with Locations((-49.127580054, -1.25)):
            Circle(SKETCH_2_13_R_2, mode=Mode.SUBTRACT)
    extrude(amount=EXTRUDE_12_DEPTH)

    # 草图2<14> → 凸台-拉伸13 (add)
    with BuildSketch(Plane.XY):
        with Locations((-49.127580054, -26.25)):
            Circle(SKETCH_2_14_R)
        with Locations((-49.127580054, -26.25)):
            Circle(SKETCH_2_14_R_2, mode=Mode.SUBTRACT)
    extrude(amount=EXTRUDE_13_DEPTH)

    # 草图2<15> → 凸台-拉伸14 (add)
    with BuildSketch(Plane.XY):
        Circle(SKETCH_2_15_R)
        Circle(SKETCH_2_15_R_2, mode=Mode.SUBTRACT)
    extrude(amount=EXTRUDE_14_DEPTH)

    # 草图2<16> → 凸台-拉伸15 (add)
    with BuildSketch(Plane.XY):
        with Locations((0, -27.5)):
            Circle(SKETCH_2_16_R)
        with Locations((0, -27.5)):
            Circle(SKETCH_2_16_R_2, mode=Mode.SUBTRACT)
    extrude(amount=EXTRUDE_15_DEPTH)

    # 草图2<19> → 切除-拉伸4 (cut)
    with BuildSketch(Plane.XY):
        with Locations((-49.127580054, -1.25)):
            Circle(SKETCH_2_19_R)
        with Locations((-49.127580054, -1.25)):
            Circle(SKETCH_2_19_R_2, mode=Mode.SUBTRACT)
    extrude(amount=CUT_EXTRUDE_4_DEPTH, mode=Mode.SUBTRACT)

    # 草图2<20> → 切除-拉伸5 (cut)
    with BuildSketch(Plane.XY):
        with Locations((-49.127580054, -26.25)):
            Circle(SKETCH_2_20_R)
        with Locations((-49.127580054, -26.25)):
            Circle(SKETCH_2_20_R_2, mode=Mode.SUBTRACT)
    extrude(amount=CUT_EXTRUDE_5_DEPTH, mode=Mode.SUBTRACT)

    # 草图2<21> → 切除-拉伸6 (cut)
    with BuildSketch(Plane.XY):
        with Locations((0, -27.5)):
            Circle(SKETCH_2_21_R)
        with Locations((0, -27.5)):
            Circle(SKETCH_2_21_R_2, mode=Mode.SUBTRACT)
    extrude(amount=CUT_EXTRUDE_6_DEPTH, mode=Mode.SUBTRACT)

    # 草图2<22> → 切除-拉伸7 (cut)
    with BuildSketch(Plane.XY):
        Circle(SKETCH_2_22_R)
        Circle(SKETCH_2_22_R_2, mode=Mode.SUBTRACT)
    extrude(amount=CUT_EXTRUDE_7_DEPTH, mode=Mode.SUBTRACT)

    # 草图2<23> → 凸台-拉伸16 (add)
    with BuildSketch(Plane.XY):
        with BuildLine():
            Line((-51.127580054, -1.25), (-51.127580054, -26.25))
            ThreePointArc((-51.127580054, -26.25), (-49.127580054, -24.25), (-47.127580054, -26.25))
            Line((-47.127580054, -26.25), (-47.127580054, -23.75))
            Line((-47.127580054, -23.75), (-47.984053528, -23.75))
            Line((-47.984053528, -23.75), (-47.984053528, -13.75))
            Line((-47.984053528, -13.75), (-47.984053528, -3.75))
            Line((-47.984053528, -3.75), (-47.127580054, -3.75))
            Line((-47.127580054, -3.75), (-47.127580054, -1.25))
            ThreePointArc((-47.127580054, -1.25), (-49.127580054, -3.25), (-51.127580054, -1.25))
        make_face()
    extrude(amount=EXTRUDE_16_DEPTH)

    # 草图2<24> → 凸台-拉伸18 (add)
    with BuildSketch(Plane.XY):
        with BuildLine():
            ThreePointArc((-1.437125342, -28.890924423), (-1.390924423, -26.062874658), (1.437125342, -26.109075577))
            Line((1.437125342, -26.109075577), (-3.540773877, -20.965830555))
            ThreePointArc((-3.540773877, -20.965830555), (-4.446613365, -22.905688013), (-6.415024561, -23.747679402))
            Line((-6.415024561, -23.747679402), (-1.437125342, -28.890924423))
        make_face()
        with BuildLine():
            Line((-3.540773877, -6.534169445), (1.437125342, -1.390924423))
            ThreePointArc((1.437125342, -1.390924423), (-1.390924423, -1.437125342), (-1.437125342, 1.390924423))
            Line((-1.437125342, 1.390924423), (-6.415024561, -3.752320598))
            ThreePointArc((-6.415024561, -3.752320598), (-4.446613365, -4.594311987), (-3.540773877, -6.534169445))
        make_face()
    extrude(amount=EXTRUDE_18_DEPTH)

    # 草图4 → 凸台-拉伸19 (add)
    with BuildSketch(Plane(origin=(0, 0, 0), x_dir=(-1, 0, 0), z_dir=(0, 0, -1))):
        with BuildLine():
            Line((27.712083902, 2.374023685), (27.712083902, -0.625976315))
            ThreePointArc((27.712083902, -0.625976315), (24.712083902, -3.625976315), (21.712083902, -0.625976315))
            Line((21.712083902, -0.625976315), (21.712083902, 2.374023685))
            ThreePointArc((21.712083902, 2.374023685), (24.712083902, 5.374023685), (27.712083902, 2.374023685))
        make_face()
        with BuildLine():
            Line((21.712083902, -29.874023685), (21.712083902, -26.874023685))
            ThreePointArc((21.712083902, -26.874023685), (24.712083902, -23.874023685), (27.712083902, -26.874023685))
            Line((27.712083902, -26.874023685), (27.712083902, -29.874023685))
            ThreePointArc((27.712083902, -29.874023685), (24.712083902, -32.874023685), (21.712083902, -29.874023685))
        make_face()
    extrude(amount=-EXTRUDE_19_DEPTH)

    # 草图5 → 切除-拉伸9 (cut)
    with BuildSketch(Plane.XY.offset(1)):
        with Locations((-25.795795215, -29.846368989)):
            Rectangle(SKETCH_5_W, SKETCH_5_H)
        with Locations((-23.726763116, -29.899167603)):
            Rectangle(SKETCH_5_W_2, SKETCH_5_H_2)
    extrude(amount=-CUT_EXTRUDE_9_DEPTH, mode=Mode.SUBTRACT)


solid = part.part
